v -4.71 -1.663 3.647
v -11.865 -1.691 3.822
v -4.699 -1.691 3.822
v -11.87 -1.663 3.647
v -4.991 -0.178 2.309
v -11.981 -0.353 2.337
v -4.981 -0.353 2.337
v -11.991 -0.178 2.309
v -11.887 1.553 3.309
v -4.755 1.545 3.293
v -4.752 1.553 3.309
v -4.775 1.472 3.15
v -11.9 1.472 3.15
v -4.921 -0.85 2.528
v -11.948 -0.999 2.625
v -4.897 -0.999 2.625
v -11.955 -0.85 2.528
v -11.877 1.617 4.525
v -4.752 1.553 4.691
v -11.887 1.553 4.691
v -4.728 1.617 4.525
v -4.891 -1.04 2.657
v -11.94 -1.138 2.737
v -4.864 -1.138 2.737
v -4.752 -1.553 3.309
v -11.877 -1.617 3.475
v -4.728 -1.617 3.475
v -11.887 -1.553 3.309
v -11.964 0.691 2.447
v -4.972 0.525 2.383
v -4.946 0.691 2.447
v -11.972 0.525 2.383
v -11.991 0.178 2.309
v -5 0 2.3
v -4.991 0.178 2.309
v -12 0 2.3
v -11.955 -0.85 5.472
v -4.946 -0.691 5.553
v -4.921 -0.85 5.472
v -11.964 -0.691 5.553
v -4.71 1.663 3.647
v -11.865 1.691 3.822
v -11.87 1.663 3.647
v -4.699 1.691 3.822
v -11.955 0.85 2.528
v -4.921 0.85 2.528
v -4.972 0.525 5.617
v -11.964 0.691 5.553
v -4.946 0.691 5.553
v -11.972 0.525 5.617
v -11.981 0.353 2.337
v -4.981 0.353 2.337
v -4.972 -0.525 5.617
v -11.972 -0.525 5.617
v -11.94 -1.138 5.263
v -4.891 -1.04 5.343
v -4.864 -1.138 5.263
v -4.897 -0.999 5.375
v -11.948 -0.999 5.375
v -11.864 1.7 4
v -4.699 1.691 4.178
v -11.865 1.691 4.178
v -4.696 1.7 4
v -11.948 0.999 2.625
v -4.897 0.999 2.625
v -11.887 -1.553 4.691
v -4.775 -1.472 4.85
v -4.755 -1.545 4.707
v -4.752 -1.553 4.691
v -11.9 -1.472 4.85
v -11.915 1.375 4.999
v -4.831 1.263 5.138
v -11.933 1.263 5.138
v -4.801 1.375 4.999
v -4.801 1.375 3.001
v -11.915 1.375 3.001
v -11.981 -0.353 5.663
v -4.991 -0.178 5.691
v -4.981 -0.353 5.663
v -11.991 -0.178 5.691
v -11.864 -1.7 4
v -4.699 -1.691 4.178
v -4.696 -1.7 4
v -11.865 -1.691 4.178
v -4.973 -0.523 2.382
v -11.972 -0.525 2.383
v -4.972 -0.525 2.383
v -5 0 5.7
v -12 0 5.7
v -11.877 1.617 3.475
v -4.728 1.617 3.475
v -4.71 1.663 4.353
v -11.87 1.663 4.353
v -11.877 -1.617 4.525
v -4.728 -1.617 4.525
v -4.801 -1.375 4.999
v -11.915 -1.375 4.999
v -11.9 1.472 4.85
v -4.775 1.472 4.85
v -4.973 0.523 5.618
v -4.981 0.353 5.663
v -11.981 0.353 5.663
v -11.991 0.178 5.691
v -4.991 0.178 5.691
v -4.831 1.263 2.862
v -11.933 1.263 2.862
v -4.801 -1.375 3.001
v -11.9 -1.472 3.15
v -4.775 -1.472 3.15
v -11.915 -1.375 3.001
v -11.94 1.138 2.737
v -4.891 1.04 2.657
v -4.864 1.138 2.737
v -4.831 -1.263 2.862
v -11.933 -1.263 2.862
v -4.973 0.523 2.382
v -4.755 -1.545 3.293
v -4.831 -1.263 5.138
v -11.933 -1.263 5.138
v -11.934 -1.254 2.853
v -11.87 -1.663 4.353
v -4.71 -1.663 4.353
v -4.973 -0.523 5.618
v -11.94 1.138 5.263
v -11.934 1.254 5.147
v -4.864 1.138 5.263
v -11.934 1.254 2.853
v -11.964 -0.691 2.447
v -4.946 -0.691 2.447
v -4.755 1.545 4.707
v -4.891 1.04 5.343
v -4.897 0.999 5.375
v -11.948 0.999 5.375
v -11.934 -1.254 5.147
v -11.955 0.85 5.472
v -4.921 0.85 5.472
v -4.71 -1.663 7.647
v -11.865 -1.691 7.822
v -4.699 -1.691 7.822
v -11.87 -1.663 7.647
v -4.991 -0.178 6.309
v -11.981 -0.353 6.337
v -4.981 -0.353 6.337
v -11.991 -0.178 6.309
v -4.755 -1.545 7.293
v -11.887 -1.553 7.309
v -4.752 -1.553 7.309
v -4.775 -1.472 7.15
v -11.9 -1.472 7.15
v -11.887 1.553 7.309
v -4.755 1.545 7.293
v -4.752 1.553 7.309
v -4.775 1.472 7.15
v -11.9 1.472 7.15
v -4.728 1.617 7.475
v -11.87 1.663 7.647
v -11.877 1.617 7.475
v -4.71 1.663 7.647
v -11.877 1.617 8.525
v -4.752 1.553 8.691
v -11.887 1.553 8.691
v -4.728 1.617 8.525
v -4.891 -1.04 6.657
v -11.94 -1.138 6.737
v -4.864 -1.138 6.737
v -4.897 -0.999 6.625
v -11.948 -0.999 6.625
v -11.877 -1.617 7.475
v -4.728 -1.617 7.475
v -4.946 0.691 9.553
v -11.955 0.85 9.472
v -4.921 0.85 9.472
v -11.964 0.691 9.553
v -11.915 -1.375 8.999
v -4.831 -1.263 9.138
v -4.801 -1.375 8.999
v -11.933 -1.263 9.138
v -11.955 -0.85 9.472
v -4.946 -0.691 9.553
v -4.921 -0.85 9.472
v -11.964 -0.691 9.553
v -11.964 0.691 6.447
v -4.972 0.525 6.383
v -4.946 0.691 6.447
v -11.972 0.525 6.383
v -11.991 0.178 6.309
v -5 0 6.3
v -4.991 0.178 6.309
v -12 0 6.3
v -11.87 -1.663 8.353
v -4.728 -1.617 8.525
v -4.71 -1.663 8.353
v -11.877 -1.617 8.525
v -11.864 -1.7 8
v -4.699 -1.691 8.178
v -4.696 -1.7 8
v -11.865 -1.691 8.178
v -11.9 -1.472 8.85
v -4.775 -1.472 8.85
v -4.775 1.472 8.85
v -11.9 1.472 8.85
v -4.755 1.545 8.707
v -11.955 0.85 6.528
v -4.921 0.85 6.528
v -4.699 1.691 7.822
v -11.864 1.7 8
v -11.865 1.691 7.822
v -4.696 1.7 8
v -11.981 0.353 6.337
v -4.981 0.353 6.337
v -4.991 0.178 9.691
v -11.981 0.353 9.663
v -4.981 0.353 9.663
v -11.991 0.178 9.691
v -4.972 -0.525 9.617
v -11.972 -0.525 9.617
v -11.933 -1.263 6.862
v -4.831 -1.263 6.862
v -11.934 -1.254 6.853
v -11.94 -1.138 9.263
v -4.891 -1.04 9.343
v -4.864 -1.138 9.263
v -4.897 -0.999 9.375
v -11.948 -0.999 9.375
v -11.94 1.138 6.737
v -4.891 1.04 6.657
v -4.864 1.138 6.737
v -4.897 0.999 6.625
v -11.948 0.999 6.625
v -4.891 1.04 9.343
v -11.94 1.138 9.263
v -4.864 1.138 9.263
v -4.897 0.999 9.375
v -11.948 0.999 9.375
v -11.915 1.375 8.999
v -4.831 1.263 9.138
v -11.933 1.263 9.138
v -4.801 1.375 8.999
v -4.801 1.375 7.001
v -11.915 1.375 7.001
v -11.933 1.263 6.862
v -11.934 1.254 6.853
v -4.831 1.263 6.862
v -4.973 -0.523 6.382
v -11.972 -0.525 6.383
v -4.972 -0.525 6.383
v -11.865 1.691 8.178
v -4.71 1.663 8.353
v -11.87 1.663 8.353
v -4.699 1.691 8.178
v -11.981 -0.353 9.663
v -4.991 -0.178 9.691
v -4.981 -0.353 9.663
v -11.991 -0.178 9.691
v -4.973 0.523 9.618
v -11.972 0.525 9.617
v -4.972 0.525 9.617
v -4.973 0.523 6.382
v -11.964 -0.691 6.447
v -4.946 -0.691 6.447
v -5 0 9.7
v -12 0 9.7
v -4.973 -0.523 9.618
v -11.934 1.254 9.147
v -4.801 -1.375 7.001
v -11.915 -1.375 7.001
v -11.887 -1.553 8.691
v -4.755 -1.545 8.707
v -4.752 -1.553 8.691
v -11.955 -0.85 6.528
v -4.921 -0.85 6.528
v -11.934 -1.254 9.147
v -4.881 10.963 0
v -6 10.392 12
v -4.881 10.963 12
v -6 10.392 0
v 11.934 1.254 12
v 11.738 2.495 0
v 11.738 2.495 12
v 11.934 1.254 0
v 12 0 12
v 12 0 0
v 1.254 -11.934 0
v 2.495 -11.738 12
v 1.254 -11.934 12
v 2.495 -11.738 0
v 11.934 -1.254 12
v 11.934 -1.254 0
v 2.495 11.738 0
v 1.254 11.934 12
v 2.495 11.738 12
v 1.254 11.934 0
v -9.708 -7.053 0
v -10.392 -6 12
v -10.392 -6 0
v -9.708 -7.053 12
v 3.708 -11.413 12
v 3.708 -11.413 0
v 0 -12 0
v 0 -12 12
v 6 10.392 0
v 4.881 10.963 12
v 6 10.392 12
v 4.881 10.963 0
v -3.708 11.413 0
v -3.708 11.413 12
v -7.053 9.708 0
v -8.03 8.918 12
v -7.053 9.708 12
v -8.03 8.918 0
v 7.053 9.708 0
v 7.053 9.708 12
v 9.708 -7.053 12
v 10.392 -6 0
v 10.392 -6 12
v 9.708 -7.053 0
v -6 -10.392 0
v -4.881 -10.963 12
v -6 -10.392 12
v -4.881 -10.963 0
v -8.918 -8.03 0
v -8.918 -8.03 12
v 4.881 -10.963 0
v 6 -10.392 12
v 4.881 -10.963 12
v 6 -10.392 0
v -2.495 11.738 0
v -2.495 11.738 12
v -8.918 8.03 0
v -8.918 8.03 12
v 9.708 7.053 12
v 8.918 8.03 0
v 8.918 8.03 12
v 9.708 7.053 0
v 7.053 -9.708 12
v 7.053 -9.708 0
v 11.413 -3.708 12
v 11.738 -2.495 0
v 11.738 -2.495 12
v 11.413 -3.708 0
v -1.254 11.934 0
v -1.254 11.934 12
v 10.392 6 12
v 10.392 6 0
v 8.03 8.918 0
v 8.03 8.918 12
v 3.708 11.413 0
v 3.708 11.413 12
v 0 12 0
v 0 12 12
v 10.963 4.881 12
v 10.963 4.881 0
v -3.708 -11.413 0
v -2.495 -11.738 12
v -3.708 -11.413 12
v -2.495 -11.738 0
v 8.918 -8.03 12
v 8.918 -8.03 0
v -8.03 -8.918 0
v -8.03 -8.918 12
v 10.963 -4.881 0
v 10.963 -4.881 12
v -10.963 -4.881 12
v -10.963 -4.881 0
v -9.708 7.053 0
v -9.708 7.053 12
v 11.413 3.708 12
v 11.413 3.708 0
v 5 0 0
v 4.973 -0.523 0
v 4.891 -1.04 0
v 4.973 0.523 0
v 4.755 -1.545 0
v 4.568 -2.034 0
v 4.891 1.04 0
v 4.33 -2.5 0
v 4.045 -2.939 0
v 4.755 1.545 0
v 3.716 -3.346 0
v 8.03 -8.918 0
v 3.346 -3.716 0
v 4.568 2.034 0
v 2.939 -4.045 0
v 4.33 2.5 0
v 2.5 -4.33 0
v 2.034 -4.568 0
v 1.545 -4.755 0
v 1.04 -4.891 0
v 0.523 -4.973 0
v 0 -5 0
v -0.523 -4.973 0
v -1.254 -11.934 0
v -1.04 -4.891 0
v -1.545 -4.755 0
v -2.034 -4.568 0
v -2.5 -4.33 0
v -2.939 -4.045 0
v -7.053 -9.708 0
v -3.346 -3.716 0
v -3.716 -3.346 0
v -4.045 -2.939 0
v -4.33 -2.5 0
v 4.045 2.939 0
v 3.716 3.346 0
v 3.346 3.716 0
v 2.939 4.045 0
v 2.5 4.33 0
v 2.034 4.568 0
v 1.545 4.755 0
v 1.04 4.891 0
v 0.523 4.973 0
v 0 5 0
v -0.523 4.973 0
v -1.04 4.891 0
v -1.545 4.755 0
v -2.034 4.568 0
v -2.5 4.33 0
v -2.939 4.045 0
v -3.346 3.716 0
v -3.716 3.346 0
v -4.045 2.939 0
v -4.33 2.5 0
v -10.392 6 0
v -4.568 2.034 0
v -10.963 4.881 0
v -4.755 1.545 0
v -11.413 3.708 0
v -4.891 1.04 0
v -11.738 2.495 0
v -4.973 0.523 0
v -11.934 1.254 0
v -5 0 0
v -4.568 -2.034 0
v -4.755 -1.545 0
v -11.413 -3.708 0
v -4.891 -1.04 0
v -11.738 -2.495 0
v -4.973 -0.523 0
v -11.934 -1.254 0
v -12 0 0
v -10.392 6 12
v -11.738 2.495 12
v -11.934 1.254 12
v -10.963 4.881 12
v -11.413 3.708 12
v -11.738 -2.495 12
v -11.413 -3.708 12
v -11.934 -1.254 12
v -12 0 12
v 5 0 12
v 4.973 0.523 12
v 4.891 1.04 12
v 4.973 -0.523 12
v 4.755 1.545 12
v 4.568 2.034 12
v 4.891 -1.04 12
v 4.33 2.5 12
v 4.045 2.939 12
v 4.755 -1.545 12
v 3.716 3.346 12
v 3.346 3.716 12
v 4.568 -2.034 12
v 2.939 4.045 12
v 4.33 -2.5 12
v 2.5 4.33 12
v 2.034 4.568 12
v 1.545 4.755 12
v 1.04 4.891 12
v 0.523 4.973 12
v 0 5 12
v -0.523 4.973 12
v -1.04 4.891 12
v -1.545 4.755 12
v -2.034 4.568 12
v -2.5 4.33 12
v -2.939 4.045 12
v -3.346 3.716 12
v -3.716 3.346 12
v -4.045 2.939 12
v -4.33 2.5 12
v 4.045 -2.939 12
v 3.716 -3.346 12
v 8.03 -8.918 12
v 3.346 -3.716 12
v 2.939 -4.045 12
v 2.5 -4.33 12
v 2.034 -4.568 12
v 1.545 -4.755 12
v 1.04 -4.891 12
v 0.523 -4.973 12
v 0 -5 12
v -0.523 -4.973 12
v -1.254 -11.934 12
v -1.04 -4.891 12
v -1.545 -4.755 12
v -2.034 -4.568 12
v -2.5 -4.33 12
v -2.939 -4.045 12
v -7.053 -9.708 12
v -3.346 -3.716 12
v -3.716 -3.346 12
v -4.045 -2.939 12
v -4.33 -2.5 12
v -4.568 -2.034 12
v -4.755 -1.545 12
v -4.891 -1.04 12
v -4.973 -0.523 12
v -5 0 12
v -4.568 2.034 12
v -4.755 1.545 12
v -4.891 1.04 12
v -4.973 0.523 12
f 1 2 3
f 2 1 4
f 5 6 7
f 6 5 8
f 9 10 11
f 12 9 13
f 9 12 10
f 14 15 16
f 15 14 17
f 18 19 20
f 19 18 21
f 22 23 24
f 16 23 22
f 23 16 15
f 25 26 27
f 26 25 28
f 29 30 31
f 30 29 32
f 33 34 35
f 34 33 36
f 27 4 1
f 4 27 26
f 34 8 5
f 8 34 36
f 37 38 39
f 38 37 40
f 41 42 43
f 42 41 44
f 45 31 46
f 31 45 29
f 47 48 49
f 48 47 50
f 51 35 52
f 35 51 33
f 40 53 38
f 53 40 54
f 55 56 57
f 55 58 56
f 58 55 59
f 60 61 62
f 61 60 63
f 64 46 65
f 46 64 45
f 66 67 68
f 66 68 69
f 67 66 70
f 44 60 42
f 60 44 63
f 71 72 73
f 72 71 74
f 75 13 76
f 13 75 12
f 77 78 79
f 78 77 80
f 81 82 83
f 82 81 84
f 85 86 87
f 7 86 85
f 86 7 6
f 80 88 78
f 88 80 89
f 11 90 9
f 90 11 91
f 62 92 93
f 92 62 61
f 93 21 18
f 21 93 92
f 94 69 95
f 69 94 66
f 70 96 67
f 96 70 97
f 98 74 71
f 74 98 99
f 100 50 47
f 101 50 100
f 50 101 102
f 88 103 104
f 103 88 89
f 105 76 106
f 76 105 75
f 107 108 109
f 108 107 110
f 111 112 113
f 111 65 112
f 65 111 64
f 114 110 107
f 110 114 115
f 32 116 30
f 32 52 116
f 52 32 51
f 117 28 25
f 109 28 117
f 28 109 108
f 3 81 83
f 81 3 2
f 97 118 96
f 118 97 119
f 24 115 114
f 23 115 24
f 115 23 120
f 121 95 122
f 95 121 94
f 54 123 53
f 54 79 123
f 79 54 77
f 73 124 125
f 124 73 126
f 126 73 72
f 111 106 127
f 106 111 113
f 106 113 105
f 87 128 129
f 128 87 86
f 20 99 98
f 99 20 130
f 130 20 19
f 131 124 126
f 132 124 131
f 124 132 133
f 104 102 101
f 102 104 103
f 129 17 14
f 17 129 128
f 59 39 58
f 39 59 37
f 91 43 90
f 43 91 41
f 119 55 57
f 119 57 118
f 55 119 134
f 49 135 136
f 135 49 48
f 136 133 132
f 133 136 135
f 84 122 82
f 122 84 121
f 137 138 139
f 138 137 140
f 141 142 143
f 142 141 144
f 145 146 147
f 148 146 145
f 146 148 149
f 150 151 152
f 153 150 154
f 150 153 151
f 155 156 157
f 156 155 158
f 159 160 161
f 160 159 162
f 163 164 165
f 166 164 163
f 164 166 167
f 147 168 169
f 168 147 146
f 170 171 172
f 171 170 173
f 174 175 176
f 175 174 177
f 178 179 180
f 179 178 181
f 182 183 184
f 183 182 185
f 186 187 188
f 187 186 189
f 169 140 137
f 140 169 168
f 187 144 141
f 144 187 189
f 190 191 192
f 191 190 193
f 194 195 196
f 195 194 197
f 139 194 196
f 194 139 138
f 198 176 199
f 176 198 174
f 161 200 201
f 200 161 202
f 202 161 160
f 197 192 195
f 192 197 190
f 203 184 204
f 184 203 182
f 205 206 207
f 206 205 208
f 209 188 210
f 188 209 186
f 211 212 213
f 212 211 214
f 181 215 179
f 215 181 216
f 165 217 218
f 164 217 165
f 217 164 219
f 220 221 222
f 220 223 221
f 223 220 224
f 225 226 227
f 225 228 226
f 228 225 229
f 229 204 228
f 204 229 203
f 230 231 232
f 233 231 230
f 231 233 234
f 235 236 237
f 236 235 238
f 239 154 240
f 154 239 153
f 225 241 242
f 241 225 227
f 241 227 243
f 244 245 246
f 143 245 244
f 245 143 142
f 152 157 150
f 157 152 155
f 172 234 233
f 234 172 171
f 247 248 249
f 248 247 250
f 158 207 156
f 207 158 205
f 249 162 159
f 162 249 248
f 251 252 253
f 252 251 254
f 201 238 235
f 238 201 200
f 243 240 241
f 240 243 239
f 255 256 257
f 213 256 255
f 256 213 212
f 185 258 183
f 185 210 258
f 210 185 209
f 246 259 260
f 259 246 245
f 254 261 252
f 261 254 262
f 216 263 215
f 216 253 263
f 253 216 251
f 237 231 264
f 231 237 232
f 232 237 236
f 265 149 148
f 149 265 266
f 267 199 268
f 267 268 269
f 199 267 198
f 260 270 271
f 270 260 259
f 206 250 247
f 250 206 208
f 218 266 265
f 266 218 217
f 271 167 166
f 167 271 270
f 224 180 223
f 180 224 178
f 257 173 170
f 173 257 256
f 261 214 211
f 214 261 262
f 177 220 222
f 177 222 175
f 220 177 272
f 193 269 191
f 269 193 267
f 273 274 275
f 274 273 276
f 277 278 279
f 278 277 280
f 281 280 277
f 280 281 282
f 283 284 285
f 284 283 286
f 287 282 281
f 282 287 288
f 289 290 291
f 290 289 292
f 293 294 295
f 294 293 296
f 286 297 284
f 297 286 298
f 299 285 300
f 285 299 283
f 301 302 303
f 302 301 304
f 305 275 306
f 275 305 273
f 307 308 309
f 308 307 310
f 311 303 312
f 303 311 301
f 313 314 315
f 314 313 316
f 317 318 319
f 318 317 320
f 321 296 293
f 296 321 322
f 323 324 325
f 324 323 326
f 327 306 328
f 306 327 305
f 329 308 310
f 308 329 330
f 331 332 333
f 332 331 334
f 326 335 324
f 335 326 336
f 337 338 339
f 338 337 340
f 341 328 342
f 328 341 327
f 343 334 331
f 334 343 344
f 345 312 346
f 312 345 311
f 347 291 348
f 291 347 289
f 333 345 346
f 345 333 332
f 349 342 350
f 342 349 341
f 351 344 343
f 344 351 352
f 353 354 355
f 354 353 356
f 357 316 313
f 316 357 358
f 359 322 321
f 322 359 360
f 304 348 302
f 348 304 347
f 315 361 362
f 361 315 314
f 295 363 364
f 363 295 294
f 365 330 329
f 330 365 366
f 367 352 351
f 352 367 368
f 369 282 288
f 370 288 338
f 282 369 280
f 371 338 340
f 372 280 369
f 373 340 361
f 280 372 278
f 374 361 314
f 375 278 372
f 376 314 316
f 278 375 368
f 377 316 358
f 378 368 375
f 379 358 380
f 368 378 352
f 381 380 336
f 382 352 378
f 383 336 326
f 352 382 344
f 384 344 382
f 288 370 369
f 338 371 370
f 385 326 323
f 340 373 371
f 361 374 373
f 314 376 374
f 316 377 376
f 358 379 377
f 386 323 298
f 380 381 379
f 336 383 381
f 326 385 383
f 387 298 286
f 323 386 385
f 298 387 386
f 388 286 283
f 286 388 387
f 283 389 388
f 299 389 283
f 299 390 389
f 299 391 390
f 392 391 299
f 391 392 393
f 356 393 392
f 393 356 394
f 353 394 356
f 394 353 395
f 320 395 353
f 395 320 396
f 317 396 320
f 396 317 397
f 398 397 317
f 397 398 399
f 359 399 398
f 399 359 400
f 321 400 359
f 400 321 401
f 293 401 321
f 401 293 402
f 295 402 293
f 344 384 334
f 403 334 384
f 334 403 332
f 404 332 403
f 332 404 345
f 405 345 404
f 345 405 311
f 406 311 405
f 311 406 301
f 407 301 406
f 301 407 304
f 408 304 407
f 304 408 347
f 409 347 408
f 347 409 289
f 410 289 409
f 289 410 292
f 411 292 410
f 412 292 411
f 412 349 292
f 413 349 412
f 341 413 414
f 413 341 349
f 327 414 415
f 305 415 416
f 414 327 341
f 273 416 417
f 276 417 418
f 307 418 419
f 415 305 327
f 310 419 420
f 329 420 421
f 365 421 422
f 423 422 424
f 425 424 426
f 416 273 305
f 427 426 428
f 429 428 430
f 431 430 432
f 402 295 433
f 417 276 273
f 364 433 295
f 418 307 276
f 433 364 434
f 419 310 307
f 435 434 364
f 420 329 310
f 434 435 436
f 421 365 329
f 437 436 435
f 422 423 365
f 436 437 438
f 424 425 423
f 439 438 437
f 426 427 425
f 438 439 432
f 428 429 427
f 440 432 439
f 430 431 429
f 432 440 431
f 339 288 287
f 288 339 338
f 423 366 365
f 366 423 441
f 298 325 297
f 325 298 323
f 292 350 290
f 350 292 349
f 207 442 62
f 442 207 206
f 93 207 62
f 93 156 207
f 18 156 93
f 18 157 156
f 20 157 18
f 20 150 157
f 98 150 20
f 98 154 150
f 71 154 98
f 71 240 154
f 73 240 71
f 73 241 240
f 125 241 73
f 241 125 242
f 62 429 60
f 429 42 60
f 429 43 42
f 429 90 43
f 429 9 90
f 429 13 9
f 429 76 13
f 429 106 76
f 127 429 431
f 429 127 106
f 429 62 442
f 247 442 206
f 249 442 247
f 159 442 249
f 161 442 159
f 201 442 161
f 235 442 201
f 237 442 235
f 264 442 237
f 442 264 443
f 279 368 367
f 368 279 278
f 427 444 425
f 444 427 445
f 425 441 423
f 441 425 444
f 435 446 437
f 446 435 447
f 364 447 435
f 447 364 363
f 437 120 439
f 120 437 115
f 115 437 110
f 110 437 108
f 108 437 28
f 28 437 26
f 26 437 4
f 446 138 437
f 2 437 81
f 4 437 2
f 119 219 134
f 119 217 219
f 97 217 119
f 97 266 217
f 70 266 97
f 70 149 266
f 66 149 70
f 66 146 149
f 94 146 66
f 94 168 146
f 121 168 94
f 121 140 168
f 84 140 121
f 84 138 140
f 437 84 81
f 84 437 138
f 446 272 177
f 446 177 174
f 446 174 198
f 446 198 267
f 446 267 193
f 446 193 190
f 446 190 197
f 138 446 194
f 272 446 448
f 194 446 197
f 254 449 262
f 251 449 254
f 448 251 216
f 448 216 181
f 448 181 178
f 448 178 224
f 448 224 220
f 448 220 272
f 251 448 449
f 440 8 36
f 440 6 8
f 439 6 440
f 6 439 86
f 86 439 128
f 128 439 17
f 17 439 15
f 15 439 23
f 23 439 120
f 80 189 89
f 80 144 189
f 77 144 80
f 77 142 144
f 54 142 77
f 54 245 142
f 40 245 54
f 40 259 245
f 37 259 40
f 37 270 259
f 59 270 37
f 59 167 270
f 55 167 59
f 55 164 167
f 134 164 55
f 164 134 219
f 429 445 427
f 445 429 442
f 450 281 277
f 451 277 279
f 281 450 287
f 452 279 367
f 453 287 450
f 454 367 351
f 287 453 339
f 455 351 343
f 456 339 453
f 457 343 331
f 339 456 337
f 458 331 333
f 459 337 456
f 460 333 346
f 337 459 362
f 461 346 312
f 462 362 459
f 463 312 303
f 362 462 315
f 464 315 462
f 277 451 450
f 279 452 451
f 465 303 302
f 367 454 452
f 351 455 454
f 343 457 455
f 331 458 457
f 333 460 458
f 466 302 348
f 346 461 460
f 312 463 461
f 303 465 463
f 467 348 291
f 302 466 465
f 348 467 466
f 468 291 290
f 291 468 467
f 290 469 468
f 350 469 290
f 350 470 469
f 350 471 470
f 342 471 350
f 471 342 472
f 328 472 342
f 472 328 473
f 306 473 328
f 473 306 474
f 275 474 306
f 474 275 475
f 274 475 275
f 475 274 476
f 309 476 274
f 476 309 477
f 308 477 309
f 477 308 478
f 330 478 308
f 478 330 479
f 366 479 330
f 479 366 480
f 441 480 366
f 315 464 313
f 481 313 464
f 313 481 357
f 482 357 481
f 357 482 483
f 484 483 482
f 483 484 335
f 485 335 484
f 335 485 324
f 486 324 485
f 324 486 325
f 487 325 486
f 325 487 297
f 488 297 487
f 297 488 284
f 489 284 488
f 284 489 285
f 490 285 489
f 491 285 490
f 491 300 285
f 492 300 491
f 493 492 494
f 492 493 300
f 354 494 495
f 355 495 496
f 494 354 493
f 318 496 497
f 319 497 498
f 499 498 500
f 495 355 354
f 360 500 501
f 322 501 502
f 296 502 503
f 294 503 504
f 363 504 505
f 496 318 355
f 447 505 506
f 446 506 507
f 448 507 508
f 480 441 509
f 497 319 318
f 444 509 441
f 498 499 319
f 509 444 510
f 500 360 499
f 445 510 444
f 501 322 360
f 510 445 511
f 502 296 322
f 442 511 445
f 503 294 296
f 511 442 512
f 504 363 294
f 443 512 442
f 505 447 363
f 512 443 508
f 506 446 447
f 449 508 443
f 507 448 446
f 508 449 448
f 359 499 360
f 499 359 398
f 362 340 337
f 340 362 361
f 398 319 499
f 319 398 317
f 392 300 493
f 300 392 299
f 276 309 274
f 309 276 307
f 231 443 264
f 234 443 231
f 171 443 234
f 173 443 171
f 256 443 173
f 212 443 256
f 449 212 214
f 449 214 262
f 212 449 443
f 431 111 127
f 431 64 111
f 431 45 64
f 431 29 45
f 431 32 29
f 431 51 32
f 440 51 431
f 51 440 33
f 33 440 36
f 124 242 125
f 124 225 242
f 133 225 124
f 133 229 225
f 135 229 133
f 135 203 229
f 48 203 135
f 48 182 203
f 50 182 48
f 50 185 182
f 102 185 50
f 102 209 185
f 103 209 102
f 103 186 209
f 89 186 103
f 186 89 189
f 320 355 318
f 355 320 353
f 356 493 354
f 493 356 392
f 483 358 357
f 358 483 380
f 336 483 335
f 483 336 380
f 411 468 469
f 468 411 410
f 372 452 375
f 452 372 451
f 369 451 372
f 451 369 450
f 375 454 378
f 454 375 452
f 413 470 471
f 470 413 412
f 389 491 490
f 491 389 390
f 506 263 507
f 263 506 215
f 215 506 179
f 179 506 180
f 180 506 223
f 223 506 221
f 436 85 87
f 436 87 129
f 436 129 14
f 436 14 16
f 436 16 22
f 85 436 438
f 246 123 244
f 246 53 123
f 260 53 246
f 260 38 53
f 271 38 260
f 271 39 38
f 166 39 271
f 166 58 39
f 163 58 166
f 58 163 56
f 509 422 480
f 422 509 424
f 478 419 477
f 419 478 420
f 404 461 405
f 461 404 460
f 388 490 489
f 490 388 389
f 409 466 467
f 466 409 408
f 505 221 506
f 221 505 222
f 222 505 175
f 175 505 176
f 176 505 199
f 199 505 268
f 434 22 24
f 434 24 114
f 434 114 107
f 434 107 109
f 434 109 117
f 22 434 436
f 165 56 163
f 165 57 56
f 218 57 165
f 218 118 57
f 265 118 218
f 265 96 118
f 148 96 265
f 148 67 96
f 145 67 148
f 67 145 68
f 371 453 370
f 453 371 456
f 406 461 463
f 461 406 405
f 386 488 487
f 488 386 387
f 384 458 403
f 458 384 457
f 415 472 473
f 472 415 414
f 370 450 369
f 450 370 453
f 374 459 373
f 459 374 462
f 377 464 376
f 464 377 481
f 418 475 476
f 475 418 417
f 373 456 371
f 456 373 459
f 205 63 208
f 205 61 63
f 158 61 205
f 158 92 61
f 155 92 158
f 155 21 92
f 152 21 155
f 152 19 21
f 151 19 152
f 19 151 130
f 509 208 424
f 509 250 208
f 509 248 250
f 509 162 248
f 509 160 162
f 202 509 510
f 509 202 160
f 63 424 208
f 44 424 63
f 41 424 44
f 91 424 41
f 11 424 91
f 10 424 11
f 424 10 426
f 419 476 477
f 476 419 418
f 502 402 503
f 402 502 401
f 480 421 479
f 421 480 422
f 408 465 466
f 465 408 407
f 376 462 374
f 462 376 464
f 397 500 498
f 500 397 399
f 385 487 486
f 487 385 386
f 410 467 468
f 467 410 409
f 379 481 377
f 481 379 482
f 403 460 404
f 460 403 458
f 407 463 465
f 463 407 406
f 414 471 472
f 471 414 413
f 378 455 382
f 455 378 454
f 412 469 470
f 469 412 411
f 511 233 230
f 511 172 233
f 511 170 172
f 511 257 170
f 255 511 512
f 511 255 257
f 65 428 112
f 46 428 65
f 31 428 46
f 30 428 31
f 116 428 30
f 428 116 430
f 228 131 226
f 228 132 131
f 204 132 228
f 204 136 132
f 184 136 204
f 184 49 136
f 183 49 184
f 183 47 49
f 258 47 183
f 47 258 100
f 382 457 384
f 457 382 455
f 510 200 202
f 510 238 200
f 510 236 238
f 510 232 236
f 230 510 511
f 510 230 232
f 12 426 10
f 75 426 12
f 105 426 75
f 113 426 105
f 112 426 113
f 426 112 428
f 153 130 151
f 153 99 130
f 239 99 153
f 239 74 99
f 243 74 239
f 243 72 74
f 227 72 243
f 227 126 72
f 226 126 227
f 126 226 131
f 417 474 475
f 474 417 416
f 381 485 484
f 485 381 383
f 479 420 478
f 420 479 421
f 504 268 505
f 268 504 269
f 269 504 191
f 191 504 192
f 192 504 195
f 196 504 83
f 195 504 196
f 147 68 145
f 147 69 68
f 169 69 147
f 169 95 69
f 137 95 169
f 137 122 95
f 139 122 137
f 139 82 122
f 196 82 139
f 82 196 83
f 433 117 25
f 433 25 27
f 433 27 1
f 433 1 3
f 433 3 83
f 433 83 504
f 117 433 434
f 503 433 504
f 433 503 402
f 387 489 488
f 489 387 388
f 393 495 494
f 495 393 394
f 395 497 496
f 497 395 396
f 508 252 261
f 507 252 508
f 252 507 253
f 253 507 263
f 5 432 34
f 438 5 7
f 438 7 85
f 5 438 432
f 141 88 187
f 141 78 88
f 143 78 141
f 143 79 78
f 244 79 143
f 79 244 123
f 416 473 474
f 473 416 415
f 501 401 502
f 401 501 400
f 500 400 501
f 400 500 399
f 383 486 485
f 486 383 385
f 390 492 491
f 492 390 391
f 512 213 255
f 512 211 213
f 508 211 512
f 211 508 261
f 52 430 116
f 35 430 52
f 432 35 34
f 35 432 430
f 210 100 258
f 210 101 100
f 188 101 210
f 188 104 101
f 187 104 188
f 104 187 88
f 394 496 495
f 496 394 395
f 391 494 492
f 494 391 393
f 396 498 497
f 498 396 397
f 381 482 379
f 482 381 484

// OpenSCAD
// Double-screw locking collar.
$fn = 60;
eps = 0.02;
shaft_d = 10;
outer_d = 24;
width = 12;
difference() {
    cylinder(d=outer_d,h=width);
    translate([0,0,-eps]) cylinder(d=shaft_d,h=width+2*eps);
    for (z=[width/3,2*width/3]) translate([-outer_d/2-eps,0,z]) rotate([0,90,0]) cylinder(d=3.4,h=outer_d/2+2*eps);
}
